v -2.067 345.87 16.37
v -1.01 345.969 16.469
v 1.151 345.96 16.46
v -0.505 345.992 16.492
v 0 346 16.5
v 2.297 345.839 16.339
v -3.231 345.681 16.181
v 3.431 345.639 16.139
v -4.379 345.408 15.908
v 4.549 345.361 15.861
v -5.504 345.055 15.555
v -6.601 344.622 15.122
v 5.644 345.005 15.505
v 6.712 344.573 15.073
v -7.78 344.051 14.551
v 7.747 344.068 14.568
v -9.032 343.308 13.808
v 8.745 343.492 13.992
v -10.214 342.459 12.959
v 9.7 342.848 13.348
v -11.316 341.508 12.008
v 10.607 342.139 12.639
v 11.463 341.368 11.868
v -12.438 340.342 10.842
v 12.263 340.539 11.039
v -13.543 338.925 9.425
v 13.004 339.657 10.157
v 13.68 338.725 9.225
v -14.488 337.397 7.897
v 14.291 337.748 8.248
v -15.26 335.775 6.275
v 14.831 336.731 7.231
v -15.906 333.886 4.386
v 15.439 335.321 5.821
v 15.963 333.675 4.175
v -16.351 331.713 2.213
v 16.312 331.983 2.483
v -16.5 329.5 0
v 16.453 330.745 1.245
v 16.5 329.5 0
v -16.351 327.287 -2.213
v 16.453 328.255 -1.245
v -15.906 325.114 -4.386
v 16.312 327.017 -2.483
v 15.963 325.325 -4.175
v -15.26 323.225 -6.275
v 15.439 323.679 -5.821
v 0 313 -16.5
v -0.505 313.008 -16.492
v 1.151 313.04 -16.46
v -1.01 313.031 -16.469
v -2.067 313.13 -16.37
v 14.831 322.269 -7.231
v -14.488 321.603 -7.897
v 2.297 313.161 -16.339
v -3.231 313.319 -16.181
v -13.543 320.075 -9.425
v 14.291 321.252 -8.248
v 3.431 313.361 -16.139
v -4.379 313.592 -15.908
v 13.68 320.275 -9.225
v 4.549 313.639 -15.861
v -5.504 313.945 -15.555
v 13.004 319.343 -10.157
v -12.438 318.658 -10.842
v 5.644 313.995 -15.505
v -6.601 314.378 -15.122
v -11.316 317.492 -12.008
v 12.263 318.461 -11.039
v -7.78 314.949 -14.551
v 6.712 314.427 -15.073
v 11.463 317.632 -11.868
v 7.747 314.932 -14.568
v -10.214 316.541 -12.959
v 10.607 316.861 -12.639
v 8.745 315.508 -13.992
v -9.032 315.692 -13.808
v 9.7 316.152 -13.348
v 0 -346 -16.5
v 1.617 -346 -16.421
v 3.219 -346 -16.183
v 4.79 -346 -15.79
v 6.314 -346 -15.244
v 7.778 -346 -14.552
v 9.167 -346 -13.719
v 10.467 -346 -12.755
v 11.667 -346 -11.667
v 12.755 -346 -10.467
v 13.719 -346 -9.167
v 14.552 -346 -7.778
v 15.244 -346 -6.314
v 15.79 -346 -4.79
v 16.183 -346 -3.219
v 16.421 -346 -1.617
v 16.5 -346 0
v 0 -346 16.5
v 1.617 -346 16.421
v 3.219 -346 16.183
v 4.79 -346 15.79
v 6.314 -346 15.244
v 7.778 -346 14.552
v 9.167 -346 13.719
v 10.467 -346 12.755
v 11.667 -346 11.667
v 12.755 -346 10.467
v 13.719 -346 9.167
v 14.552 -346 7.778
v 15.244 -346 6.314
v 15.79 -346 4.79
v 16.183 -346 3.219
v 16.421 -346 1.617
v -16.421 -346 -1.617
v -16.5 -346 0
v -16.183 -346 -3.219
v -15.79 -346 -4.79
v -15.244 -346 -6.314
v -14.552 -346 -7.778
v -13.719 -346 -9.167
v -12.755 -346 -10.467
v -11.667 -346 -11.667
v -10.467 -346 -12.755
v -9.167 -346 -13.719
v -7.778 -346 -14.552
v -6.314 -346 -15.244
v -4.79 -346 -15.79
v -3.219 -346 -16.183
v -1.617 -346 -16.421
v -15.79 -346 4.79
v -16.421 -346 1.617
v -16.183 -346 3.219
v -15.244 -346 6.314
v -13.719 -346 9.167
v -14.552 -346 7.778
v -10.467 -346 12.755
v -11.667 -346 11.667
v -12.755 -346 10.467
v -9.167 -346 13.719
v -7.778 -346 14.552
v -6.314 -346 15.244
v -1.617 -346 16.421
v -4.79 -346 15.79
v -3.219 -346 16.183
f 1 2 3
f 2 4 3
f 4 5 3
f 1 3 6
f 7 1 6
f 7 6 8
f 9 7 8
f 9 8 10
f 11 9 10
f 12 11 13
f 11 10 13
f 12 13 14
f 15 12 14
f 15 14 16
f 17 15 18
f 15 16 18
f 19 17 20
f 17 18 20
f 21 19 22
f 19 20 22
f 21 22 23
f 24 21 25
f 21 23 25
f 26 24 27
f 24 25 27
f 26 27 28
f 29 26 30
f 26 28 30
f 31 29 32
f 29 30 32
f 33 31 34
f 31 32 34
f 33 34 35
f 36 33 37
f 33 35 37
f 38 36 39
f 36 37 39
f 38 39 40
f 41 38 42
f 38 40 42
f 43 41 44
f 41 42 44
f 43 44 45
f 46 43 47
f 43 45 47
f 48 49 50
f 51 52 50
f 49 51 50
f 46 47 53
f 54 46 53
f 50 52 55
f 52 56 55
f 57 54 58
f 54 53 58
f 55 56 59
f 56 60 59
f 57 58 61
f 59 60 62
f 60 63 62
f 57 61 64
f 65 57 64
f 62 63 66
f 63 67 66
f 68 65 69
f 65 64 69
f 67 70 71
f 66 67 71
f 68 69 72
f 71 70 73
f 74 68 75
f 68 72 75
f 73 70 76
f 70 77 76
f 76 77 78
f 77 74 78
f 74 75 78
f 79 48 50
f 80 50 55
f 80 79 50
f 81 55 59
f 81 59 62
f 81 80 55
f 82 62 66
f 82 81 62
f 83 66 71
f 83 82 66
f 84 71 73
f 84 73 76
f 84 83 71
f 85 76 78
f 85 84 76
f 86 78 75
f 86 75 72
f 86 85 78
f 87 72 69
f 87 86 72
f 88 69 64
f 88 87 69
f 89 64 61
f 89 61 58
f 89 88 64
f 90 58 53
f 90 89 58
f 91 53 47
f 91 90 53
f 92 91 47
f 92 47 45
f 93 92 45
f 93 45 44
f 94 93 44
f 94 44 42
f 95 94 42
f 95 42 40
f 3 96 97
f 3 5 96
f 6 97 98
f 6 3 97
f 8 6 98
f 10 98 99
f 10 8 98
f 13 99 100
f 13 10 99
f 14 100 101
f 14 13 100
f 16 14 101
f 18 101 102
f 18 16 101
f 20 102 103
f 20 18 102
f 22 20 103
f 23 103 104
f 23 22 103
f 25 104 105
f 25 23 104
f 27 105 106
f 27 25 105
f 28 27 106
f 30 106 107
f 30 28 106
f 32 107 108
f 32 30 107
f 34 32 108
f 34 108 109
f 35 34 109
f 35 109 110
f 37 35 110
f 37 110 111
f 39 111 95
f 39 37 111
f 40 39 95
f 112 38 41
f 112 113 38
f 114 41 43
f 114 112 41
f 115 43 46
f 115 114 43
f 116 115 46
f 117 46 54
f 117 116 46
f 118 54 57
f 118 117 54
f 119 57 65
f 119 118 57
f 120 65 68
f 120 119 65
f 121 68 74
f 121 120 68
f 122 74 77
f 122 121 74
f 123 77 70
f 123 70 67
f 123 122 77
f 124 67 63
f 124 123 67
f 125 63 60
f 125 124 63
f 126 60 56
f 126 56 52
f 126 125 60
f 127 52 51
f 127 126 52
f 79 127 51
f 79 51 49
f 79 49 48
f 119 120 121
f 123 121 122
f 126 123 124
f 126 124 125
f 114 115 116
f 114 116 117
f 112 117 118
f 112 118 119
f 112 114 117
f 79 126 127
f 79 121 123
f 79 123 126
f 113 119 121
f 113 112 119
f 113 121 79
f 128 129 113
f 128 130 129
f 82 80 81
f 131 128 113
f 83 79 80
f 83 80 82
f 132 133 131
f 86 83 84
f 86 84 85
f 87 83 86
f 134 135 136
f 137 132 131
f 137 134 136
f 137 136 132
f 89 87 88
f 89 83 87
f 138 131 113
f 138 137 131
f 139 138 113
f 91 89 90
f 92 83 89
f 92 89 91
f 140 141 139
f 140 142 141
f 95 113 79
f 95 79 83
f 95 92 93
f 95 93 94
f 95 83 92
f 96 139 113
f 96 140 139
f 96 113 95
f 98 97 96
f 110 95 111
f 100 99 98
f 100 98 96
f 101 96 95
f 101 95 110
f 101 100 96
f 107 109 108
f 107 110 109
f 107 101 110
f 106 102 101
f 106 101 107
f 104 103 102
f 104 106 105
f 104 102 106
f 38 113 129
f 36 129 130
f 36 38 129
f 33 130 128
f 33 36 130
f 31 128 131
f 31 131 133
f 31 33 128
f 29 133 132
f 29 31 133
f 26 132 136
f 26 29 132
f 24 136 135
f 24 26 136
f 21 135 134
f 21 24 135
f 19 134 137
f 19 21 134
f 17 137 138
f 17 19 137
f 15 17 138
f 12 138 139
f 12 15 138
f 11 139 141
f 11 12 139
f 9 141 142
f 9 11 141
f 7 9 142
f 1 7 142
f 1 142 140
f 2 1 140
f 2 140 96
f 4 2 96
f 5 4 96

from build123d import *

# Parameters (mm, degrees)
F0_W     = 33
F0_H     = 33
F1_DEPTH = 346
F3_DEPTH = 50
F4_R     = 16.49999


# Not quite as in the source:
# - a fillet or chamfer is up to 0.001 mm smaller than in the source, because OpenCascade refuses the exact size
# - a feature names something its author has since deleted; it is built from what else it names


with BuildPart() as f1:
    # F0 (on Front) → F1 (new body, symmetric)
    with BuildSketch(Plane.XZ):
        Rectangle(F0_W, F0_H)
    extrude(amount=F1_DEPTH, both=True)

    # F2 (on face) → F3 (cut)
    with BuildSketch(Plane.YZ.offset(16.5)):
        Polygon((346, -16.5), (346, 16.5), (313, -16.5), align=None)
    extrude(amount=-F3_DEPTH, mode=Mode.SUBTRACT)

    # F4 (radius 16.5 in the source; OpenCascade refuses exactly that, so slightly less here)
    f4_edges = [f1.edges().sort_by_distance(p)[0] for p in [
        (16.5, 0, 16.5),
        (16.5, -16.5, -16.5),
        (-16.5, -16.5, -16.5),
        (-16.5, 0, 16.5),
    ]]
    fillet(f4_edges, radius=F4_R)


solid = f1.part
